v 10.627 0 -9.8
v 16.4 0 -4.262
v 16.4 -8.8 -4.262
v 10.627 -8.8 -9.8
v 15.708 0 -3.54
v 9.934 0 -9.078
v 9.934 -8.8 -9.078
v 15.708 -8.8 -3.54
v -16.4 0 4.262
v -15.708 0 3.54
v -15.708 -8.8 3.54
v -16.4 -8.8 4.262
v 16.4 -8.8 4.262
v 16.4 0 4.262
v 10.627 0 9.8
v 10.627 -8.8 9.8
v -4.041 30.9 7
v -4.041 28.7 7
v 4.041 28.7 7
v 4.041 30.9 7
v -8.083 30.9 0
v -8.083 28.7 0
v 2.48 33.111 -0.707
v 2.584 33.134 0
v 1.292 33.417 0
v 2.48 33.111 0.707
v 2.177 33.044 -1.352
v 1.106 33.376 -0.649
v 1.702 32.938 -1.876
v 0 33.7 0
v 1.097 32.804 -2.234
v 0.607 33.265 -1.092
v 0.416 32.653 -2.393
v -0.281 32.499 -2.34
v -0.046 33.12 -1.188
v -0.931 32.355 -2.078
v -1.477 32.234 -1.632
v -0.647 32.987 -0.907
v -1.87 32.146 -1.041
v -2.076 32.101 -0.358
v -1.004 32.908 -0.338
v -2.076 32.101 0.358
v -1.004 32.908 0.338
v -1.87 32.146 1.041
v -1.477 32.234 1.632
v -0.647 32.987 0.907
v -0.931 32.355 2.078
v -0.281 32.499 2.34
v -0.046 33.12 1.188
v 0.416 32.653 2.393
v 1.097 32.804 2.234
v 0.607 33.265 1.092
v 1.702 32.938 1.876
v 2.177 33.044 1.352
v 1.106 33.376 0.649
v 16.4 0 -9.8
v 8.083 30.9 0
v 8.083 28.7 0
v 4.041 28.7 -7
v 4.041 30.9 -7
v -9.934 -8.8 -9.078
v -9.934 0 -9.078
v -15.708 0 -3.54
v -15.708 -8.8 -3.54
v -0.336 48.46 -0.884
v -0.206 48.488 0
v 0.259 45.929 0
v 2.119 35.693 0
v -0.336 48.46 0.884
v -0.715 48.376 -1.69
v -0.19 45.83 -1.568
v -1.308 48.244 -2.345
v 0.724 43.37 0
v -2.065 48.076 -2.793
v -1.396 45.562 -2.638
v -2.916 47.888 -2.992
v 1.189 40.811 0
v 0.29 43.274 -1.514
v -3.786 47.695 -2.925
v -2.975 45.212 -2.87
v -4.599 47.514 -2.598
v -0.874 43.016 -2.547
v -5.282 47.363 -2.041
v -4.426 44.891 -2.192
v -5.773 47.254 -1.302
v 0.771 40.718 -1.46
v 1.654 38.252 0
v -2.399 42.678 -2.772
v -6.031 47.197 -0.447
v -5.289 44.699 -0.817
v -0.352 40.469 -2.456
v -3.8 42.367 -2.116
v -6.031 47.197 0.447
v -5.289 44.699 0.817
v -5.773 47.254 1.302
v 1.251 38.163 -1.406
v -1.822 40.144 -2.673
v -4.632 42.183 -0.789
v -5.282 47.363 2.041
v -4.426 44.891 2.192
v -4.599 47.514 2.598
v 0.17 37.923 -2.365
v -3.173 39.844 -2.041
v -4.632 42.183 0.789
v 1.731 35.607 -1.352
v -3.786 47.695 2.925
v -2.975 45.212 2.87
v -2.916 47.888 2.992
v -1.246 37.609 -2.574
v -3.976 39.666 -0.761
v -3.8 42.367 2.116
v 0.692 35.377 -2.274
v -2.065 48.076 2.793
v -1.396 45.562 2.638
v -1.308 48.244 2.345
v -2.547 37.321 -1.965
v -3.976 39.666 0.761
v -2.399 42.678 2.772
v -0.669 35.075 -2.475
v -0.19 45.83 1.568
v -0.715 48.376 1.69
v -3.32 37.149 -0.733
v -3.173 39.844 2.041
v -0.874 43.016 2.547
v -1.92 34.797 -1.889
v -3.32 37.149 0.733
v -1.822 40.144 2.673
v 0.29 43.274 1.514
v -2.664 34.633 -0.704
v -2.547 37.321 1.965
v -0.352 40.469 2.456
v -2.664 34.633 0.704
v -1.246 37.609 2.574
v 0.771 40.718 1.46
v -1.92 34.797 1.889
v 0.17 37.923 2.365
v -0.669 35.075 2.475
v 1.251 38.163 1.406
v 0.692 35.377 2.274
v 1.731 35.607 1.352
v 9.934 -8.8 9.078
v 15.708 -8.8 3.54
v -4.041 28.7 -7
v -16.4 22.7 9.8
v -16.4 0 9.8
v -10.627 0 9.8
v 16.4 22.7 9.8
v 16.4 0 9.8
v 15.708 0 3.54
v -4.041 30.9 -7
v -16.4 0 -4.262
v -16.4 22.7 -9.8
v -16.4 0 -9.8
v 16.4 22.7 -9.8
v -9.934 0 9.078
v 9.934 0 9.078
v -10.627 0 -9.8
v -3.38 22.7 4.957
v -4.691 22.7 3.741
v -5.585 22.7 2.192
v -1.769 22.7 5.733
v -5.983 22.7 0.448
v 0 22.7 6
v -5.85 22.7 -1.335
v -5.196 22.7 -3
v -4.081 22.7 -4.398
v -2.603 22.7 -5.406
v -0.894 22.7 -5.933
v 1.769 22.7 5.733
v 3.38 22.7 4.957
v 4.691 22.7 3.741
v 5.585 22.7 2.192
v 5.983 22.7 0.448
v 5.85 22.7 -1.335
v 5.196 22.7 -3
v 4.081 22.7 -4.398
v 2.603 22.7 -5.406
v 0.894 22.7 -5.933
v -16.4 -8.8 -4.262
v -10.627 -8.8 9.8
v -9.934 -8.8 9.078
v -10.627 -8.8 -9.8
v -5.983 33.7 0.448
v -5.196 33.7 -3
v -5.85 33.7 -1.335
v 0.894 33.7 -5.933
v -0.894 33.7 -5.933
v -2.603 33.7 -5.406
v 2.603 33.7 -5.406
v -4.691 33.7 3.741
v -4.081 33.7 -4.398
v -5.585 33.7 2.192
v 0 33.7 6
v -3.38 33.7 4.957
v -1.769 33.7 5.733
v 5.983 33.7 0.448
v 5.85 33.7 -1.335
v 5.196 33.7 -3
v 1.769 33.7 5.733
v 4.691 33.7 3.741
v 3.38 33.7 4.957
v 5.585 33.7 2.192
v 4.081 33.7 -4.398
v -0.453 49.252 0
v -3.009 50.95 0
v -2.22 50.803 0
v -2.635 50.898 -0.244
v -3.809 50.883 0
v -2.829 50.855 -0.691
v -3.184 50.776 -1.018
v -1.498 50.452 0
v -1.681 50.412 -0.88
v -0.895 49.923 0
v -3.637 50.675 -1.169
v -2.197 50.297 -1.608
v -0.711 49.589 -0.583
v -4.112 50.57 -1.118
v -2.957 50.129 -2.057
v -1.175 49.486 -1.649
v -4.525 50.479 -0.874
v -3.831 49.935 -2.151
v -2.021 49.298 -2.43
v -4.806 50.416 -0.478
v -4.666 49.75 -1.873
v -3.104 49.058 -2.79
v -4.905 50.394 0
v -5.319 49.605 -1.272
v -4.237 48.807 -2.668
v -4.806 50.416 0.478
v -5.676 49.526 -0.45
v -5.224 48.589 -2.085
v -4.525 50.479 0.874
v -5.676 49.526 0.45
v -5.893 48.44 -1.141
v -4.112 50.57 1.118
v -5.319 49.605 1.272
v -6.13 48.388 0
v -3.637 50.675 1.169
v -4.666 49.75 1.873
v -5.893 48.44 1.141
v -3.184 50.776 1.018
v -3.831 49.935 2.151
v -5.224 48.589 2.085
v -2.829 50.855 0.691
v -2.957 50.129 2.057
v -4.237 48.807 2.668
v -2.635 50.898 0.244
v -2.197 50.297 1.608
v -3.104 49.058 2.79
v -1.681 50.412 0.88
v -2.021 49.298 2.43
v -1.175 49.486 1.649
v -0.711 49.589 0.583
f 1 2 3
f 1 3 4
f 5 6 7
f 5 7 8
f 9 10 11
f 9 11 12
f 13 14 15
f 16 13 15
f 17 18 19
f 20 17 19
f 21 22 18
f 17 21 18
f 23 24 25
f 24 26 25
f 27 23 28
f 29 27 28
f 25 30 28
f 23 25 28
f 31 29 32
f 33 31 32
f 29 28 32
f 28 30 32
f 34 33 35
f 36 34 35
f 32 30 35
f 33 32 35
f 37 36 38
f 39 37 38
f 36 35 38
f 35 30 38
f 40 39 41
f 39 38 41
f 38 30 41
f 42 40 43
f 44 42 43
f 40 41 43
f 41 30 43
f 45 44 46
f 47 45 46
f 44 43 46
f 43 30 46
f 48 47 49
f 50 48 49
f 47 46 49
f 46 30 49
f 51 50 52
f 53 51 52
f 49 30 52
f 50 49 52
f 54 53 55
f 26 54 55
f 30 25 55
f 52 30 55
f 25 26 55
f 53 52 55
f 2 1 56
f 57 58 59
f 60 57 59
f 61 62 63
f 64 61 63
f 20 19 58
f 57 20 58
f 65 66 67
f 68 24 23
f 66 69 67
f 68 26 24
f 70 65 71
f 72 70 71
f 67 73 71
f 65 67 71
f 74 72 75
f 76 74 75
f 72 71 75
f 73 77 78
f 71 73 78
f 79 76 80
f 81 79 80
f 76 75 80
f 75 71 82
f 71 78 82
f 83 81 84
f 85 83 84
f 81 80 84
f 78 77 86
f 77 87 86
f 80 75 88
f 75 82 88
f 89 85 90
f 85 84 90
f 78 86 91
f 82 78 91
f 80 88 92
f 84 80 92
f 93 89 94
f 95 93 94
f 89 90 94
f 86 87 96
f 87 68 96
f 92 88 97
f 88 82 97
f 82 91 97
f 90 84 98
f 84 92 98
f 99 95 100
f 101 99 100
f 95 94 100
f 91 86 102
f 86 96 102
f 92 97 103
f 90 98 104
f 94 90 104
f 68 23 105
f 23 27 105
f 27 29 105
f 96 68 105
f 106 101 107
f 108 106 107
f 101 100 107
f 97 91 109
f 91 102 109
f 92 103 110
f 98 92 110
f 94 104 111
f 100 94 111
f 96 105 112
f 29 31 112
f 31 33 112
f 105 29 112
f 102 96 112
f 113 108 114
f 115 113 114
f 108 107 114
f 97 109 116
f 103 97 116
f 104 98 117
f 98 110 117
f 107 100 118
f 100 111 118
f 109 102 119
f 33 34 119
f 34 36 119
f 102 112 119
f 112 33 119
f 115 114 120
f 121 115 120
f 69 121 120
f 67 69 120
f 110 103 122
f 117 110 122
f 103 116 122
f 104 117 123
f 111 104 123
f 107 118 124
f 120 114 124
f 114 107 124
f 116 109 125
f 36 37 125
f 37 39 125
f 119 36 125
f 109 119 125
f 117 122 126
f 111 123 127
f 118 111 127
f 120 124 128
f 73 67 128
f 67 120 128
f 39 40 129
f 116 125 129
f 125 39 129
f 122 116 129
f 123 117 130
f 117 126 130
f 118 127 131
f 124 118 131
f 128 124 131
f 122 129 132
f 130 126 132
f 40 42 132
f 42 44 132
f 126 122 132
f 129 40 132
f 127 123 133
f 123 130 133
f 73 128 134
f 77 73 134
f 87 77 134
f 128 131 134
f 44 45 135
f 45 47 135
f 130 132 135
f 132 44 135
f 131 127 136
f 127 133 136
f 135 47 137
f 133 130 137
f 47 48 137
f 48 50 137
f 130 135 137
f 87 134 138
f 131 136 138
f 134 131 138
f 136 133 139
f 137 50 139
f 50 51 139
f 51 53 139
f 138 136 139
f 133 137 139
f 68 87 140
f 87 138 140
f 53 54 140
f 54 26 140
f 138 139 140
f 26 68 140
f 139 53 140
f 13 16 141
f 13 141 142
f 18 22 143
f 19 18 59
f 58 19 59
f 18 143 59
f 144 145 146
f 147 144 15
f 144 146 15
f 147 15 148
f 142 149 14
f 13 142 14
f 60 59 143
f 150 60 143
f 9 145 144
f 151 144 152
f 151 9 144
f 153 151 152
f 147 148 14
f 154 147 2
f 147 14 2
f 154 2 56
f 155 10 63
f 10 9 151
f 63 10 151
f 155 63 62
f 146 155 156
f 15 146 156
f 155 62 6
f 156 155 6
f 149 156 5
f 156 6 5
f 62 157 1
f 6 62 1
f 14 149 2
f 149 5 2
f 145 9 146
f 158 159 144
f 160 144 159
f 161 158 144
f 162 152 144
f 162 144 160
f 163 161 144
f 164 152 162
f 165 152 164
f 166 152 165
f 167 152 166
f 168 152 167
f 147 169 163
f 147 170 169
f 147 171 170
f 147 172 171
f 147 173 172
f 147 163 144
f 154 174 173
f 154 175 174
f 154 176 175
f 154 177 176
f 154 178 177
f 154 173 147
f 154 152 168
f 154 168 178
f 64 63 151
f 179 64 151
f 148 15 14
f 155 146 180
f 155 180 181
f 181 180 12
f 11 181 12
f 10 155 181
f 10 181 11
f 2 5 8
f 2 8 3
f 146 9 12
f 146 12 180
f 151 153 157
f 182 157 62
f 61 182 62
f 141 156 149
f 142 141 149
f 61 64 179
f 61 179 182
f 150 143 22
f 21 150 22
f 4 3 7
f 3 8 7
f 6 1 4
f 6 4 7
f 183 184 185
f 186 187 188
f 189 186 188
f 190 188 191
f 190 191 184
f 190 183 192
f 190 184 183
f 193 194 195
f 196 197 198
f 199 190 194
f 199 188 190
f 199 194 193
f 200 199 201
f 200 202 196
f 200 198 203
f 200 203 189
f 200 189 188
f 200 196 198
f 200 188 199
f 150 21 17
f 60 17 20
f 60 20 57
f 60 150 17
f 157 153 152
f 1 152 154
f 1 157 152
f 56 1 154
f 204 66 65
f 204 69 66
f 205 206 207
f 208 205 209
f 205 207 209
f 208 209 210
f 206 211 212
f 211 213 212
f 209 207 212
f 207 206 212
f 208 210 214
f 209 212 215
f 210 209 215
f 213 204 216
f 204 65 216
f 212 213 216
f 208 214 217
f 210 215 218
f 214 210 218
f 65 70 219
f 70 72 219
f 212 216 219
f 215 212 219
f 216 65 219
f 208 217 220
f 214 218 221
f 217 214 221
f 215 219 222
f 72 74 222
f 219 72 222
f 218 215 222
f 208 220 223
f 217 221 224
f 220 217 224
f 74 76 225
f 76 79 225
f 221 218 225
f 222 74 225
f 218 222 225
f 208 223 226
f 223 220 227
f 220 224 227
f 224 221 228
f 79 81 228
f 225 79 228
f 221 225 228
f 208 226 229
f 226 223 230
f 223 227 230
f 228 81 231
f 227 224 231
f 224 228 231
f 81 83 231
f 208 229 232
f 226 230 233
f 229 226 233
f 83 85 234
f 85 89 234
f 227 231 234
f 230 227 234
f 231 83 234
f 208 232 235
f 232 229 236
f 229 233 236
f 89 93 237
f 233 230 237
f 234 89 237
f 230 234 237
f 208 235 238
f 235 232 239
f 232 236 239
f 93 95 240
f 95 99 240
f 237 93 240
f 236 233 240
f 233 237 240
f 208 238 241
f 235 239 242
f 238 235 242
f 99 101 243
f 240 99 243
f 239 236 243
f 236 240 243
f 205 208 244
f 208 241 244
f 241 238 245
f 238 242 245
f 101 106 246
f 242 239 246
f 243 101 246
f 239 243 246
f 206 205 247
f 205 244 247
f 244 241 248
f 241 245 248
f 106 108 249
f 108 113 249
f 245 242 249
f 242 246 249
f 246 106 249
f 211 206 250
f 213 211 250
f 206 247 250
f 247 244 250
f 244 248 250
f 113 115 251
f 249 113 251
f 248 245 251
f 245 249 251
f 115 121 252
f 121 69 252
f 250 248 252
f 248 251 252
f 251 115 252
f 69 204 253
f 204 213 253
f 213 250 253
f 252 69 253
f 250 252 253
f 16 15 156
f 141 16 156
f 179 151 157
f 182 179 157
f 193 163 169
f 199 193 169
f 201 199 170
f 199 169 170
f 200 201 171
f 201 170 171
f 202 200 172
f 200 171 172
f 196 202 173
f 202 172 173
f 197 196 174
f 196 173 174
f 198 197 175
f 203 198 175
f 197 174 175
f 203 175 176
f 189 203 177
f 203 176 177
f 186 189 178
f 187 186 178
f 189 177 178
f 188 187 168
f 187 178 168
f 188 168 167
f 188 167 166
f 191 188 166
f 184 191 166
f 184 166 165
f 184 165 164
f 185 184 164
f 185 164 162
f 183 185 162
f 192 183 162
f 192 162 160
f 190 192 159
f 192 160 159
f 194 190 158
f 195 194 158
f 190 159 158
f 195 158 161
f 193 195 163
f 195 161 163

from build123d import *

# Parameters (mm, degrees)
ESQUISSE1_W        = 32.8
ESQUISSE1_H        = 19.6
BOSS_EXTRU_1_DEPTH = 22.7
ESQUISSE2_R        = 6
BOSS_EXTRU_2_DEPTH = 11
BOSS_EXTRU_3_DEPTH = 8.8
BOSS_EXTRU_4_START = 6
BOSS_EXTRU_4_DEPTH = 2.2


with BuildPart() as part:
    # Esquisse1 → Boss.-Extru.1 (new body)
    with BuildSketch(Plane(origin=(0, 0, 0), x_dir=(1, 0, 0), z_dir=(0, 1, 0))):
        Rectangle(ESQUISSE1_W, ESQUISSE1_H)
    extrude(amount=BOSS_EXTRU_1_DEPTH)

    # Esquisse2 → Boss.-Extru.2 (add)
    with BuildSketch(Plane(origin=(0, 22.7, 0), x_dir=(1, 0, 0), z_dir=(0, 1, 0))):
        with Locations(Location((0, 0, 0), (0, 0, 270))):
            Circle(ESQUISSE2_R)
    extrude(amount=BOSS_EXTRU_2_DEPTH)

    # Esquisse4 → Boss.-Extru.3 (add)
    with BuildSketch(Plane.XZ):
        Polygon((-16.4, 4.262076942), (-10.626664032, 9.8), (-9.93442365, 9.078333004), (-15.707759618, 3.540409946), align=None)
        Polygon((15.707759618, 3.540409946), (16.4, 4.262076942), (10.626664032, 9.8), (9.93442365, 9.078333004), align=None)
        Polygon((16.4, -4.262076942), (10.626664032, -9.8), (9.93442365, -9.078333004), (15.707759618, -3.540409946), align=None)
        Polygon((-15.707759618, -3.540409946), (-16.4, -4.262076942), (-10.626664032, -9.8), (-9.93442365, -9.078333004), align=None)
    extrude(amount=BOSS_EXTRU_3_DEPTH)


with BuildPart() as body_2:
    # Esquisse3 → Révolution1 (revolve)
    with BuildSketch(Plane.XY, mode=Mode.PRIVATE) as r_volution1_sk:
        with BuildLine():
            Line((0, 33.7), (-3.809337205, 50.882809725))
            ThreePointArc((-3.809337205, 50.882809725), (-5.722131309, 49.515864065), (-6.063443101, 47.189745413))
            Line((-6.063443101, 47.189745413), (-2.102430111, 32.094906225))
            Line((-2.102430111, 32.094906225), (0, 33.7))
        make_face()
    revolve(r_volution1_sk.sketch.rotate(Axis((0, 33.7, 0), (-0.21643961393810363, 0.9762960071199333, 0)), 180), axis=Axis((0, 33.7, 0), (-0.21643961393810363, 0.9762960071199333, 0)))


with BuildPart() as body_3:
    # Esquisse5 → Boss.-Extru.4 (new body)
    with BuildSketch(Plane(origin=(0, 22.7, 0), x_dir=(1, 0, 0), z_dir=(0, 1, 0)).offset(BOSS_EXTRU_4_START)):
        Polygon((8.082903769, 0), (4.041451884, 7), (-4.041451884, 7), (-8.082903769, 0), (-4.041451884, -7), (4.041451884, -7), align=None)
    extrude(amount=BOSS_EXTRU_4_DEPTH)


solid = Compound([part.part, body_2.part, body_3.part])
